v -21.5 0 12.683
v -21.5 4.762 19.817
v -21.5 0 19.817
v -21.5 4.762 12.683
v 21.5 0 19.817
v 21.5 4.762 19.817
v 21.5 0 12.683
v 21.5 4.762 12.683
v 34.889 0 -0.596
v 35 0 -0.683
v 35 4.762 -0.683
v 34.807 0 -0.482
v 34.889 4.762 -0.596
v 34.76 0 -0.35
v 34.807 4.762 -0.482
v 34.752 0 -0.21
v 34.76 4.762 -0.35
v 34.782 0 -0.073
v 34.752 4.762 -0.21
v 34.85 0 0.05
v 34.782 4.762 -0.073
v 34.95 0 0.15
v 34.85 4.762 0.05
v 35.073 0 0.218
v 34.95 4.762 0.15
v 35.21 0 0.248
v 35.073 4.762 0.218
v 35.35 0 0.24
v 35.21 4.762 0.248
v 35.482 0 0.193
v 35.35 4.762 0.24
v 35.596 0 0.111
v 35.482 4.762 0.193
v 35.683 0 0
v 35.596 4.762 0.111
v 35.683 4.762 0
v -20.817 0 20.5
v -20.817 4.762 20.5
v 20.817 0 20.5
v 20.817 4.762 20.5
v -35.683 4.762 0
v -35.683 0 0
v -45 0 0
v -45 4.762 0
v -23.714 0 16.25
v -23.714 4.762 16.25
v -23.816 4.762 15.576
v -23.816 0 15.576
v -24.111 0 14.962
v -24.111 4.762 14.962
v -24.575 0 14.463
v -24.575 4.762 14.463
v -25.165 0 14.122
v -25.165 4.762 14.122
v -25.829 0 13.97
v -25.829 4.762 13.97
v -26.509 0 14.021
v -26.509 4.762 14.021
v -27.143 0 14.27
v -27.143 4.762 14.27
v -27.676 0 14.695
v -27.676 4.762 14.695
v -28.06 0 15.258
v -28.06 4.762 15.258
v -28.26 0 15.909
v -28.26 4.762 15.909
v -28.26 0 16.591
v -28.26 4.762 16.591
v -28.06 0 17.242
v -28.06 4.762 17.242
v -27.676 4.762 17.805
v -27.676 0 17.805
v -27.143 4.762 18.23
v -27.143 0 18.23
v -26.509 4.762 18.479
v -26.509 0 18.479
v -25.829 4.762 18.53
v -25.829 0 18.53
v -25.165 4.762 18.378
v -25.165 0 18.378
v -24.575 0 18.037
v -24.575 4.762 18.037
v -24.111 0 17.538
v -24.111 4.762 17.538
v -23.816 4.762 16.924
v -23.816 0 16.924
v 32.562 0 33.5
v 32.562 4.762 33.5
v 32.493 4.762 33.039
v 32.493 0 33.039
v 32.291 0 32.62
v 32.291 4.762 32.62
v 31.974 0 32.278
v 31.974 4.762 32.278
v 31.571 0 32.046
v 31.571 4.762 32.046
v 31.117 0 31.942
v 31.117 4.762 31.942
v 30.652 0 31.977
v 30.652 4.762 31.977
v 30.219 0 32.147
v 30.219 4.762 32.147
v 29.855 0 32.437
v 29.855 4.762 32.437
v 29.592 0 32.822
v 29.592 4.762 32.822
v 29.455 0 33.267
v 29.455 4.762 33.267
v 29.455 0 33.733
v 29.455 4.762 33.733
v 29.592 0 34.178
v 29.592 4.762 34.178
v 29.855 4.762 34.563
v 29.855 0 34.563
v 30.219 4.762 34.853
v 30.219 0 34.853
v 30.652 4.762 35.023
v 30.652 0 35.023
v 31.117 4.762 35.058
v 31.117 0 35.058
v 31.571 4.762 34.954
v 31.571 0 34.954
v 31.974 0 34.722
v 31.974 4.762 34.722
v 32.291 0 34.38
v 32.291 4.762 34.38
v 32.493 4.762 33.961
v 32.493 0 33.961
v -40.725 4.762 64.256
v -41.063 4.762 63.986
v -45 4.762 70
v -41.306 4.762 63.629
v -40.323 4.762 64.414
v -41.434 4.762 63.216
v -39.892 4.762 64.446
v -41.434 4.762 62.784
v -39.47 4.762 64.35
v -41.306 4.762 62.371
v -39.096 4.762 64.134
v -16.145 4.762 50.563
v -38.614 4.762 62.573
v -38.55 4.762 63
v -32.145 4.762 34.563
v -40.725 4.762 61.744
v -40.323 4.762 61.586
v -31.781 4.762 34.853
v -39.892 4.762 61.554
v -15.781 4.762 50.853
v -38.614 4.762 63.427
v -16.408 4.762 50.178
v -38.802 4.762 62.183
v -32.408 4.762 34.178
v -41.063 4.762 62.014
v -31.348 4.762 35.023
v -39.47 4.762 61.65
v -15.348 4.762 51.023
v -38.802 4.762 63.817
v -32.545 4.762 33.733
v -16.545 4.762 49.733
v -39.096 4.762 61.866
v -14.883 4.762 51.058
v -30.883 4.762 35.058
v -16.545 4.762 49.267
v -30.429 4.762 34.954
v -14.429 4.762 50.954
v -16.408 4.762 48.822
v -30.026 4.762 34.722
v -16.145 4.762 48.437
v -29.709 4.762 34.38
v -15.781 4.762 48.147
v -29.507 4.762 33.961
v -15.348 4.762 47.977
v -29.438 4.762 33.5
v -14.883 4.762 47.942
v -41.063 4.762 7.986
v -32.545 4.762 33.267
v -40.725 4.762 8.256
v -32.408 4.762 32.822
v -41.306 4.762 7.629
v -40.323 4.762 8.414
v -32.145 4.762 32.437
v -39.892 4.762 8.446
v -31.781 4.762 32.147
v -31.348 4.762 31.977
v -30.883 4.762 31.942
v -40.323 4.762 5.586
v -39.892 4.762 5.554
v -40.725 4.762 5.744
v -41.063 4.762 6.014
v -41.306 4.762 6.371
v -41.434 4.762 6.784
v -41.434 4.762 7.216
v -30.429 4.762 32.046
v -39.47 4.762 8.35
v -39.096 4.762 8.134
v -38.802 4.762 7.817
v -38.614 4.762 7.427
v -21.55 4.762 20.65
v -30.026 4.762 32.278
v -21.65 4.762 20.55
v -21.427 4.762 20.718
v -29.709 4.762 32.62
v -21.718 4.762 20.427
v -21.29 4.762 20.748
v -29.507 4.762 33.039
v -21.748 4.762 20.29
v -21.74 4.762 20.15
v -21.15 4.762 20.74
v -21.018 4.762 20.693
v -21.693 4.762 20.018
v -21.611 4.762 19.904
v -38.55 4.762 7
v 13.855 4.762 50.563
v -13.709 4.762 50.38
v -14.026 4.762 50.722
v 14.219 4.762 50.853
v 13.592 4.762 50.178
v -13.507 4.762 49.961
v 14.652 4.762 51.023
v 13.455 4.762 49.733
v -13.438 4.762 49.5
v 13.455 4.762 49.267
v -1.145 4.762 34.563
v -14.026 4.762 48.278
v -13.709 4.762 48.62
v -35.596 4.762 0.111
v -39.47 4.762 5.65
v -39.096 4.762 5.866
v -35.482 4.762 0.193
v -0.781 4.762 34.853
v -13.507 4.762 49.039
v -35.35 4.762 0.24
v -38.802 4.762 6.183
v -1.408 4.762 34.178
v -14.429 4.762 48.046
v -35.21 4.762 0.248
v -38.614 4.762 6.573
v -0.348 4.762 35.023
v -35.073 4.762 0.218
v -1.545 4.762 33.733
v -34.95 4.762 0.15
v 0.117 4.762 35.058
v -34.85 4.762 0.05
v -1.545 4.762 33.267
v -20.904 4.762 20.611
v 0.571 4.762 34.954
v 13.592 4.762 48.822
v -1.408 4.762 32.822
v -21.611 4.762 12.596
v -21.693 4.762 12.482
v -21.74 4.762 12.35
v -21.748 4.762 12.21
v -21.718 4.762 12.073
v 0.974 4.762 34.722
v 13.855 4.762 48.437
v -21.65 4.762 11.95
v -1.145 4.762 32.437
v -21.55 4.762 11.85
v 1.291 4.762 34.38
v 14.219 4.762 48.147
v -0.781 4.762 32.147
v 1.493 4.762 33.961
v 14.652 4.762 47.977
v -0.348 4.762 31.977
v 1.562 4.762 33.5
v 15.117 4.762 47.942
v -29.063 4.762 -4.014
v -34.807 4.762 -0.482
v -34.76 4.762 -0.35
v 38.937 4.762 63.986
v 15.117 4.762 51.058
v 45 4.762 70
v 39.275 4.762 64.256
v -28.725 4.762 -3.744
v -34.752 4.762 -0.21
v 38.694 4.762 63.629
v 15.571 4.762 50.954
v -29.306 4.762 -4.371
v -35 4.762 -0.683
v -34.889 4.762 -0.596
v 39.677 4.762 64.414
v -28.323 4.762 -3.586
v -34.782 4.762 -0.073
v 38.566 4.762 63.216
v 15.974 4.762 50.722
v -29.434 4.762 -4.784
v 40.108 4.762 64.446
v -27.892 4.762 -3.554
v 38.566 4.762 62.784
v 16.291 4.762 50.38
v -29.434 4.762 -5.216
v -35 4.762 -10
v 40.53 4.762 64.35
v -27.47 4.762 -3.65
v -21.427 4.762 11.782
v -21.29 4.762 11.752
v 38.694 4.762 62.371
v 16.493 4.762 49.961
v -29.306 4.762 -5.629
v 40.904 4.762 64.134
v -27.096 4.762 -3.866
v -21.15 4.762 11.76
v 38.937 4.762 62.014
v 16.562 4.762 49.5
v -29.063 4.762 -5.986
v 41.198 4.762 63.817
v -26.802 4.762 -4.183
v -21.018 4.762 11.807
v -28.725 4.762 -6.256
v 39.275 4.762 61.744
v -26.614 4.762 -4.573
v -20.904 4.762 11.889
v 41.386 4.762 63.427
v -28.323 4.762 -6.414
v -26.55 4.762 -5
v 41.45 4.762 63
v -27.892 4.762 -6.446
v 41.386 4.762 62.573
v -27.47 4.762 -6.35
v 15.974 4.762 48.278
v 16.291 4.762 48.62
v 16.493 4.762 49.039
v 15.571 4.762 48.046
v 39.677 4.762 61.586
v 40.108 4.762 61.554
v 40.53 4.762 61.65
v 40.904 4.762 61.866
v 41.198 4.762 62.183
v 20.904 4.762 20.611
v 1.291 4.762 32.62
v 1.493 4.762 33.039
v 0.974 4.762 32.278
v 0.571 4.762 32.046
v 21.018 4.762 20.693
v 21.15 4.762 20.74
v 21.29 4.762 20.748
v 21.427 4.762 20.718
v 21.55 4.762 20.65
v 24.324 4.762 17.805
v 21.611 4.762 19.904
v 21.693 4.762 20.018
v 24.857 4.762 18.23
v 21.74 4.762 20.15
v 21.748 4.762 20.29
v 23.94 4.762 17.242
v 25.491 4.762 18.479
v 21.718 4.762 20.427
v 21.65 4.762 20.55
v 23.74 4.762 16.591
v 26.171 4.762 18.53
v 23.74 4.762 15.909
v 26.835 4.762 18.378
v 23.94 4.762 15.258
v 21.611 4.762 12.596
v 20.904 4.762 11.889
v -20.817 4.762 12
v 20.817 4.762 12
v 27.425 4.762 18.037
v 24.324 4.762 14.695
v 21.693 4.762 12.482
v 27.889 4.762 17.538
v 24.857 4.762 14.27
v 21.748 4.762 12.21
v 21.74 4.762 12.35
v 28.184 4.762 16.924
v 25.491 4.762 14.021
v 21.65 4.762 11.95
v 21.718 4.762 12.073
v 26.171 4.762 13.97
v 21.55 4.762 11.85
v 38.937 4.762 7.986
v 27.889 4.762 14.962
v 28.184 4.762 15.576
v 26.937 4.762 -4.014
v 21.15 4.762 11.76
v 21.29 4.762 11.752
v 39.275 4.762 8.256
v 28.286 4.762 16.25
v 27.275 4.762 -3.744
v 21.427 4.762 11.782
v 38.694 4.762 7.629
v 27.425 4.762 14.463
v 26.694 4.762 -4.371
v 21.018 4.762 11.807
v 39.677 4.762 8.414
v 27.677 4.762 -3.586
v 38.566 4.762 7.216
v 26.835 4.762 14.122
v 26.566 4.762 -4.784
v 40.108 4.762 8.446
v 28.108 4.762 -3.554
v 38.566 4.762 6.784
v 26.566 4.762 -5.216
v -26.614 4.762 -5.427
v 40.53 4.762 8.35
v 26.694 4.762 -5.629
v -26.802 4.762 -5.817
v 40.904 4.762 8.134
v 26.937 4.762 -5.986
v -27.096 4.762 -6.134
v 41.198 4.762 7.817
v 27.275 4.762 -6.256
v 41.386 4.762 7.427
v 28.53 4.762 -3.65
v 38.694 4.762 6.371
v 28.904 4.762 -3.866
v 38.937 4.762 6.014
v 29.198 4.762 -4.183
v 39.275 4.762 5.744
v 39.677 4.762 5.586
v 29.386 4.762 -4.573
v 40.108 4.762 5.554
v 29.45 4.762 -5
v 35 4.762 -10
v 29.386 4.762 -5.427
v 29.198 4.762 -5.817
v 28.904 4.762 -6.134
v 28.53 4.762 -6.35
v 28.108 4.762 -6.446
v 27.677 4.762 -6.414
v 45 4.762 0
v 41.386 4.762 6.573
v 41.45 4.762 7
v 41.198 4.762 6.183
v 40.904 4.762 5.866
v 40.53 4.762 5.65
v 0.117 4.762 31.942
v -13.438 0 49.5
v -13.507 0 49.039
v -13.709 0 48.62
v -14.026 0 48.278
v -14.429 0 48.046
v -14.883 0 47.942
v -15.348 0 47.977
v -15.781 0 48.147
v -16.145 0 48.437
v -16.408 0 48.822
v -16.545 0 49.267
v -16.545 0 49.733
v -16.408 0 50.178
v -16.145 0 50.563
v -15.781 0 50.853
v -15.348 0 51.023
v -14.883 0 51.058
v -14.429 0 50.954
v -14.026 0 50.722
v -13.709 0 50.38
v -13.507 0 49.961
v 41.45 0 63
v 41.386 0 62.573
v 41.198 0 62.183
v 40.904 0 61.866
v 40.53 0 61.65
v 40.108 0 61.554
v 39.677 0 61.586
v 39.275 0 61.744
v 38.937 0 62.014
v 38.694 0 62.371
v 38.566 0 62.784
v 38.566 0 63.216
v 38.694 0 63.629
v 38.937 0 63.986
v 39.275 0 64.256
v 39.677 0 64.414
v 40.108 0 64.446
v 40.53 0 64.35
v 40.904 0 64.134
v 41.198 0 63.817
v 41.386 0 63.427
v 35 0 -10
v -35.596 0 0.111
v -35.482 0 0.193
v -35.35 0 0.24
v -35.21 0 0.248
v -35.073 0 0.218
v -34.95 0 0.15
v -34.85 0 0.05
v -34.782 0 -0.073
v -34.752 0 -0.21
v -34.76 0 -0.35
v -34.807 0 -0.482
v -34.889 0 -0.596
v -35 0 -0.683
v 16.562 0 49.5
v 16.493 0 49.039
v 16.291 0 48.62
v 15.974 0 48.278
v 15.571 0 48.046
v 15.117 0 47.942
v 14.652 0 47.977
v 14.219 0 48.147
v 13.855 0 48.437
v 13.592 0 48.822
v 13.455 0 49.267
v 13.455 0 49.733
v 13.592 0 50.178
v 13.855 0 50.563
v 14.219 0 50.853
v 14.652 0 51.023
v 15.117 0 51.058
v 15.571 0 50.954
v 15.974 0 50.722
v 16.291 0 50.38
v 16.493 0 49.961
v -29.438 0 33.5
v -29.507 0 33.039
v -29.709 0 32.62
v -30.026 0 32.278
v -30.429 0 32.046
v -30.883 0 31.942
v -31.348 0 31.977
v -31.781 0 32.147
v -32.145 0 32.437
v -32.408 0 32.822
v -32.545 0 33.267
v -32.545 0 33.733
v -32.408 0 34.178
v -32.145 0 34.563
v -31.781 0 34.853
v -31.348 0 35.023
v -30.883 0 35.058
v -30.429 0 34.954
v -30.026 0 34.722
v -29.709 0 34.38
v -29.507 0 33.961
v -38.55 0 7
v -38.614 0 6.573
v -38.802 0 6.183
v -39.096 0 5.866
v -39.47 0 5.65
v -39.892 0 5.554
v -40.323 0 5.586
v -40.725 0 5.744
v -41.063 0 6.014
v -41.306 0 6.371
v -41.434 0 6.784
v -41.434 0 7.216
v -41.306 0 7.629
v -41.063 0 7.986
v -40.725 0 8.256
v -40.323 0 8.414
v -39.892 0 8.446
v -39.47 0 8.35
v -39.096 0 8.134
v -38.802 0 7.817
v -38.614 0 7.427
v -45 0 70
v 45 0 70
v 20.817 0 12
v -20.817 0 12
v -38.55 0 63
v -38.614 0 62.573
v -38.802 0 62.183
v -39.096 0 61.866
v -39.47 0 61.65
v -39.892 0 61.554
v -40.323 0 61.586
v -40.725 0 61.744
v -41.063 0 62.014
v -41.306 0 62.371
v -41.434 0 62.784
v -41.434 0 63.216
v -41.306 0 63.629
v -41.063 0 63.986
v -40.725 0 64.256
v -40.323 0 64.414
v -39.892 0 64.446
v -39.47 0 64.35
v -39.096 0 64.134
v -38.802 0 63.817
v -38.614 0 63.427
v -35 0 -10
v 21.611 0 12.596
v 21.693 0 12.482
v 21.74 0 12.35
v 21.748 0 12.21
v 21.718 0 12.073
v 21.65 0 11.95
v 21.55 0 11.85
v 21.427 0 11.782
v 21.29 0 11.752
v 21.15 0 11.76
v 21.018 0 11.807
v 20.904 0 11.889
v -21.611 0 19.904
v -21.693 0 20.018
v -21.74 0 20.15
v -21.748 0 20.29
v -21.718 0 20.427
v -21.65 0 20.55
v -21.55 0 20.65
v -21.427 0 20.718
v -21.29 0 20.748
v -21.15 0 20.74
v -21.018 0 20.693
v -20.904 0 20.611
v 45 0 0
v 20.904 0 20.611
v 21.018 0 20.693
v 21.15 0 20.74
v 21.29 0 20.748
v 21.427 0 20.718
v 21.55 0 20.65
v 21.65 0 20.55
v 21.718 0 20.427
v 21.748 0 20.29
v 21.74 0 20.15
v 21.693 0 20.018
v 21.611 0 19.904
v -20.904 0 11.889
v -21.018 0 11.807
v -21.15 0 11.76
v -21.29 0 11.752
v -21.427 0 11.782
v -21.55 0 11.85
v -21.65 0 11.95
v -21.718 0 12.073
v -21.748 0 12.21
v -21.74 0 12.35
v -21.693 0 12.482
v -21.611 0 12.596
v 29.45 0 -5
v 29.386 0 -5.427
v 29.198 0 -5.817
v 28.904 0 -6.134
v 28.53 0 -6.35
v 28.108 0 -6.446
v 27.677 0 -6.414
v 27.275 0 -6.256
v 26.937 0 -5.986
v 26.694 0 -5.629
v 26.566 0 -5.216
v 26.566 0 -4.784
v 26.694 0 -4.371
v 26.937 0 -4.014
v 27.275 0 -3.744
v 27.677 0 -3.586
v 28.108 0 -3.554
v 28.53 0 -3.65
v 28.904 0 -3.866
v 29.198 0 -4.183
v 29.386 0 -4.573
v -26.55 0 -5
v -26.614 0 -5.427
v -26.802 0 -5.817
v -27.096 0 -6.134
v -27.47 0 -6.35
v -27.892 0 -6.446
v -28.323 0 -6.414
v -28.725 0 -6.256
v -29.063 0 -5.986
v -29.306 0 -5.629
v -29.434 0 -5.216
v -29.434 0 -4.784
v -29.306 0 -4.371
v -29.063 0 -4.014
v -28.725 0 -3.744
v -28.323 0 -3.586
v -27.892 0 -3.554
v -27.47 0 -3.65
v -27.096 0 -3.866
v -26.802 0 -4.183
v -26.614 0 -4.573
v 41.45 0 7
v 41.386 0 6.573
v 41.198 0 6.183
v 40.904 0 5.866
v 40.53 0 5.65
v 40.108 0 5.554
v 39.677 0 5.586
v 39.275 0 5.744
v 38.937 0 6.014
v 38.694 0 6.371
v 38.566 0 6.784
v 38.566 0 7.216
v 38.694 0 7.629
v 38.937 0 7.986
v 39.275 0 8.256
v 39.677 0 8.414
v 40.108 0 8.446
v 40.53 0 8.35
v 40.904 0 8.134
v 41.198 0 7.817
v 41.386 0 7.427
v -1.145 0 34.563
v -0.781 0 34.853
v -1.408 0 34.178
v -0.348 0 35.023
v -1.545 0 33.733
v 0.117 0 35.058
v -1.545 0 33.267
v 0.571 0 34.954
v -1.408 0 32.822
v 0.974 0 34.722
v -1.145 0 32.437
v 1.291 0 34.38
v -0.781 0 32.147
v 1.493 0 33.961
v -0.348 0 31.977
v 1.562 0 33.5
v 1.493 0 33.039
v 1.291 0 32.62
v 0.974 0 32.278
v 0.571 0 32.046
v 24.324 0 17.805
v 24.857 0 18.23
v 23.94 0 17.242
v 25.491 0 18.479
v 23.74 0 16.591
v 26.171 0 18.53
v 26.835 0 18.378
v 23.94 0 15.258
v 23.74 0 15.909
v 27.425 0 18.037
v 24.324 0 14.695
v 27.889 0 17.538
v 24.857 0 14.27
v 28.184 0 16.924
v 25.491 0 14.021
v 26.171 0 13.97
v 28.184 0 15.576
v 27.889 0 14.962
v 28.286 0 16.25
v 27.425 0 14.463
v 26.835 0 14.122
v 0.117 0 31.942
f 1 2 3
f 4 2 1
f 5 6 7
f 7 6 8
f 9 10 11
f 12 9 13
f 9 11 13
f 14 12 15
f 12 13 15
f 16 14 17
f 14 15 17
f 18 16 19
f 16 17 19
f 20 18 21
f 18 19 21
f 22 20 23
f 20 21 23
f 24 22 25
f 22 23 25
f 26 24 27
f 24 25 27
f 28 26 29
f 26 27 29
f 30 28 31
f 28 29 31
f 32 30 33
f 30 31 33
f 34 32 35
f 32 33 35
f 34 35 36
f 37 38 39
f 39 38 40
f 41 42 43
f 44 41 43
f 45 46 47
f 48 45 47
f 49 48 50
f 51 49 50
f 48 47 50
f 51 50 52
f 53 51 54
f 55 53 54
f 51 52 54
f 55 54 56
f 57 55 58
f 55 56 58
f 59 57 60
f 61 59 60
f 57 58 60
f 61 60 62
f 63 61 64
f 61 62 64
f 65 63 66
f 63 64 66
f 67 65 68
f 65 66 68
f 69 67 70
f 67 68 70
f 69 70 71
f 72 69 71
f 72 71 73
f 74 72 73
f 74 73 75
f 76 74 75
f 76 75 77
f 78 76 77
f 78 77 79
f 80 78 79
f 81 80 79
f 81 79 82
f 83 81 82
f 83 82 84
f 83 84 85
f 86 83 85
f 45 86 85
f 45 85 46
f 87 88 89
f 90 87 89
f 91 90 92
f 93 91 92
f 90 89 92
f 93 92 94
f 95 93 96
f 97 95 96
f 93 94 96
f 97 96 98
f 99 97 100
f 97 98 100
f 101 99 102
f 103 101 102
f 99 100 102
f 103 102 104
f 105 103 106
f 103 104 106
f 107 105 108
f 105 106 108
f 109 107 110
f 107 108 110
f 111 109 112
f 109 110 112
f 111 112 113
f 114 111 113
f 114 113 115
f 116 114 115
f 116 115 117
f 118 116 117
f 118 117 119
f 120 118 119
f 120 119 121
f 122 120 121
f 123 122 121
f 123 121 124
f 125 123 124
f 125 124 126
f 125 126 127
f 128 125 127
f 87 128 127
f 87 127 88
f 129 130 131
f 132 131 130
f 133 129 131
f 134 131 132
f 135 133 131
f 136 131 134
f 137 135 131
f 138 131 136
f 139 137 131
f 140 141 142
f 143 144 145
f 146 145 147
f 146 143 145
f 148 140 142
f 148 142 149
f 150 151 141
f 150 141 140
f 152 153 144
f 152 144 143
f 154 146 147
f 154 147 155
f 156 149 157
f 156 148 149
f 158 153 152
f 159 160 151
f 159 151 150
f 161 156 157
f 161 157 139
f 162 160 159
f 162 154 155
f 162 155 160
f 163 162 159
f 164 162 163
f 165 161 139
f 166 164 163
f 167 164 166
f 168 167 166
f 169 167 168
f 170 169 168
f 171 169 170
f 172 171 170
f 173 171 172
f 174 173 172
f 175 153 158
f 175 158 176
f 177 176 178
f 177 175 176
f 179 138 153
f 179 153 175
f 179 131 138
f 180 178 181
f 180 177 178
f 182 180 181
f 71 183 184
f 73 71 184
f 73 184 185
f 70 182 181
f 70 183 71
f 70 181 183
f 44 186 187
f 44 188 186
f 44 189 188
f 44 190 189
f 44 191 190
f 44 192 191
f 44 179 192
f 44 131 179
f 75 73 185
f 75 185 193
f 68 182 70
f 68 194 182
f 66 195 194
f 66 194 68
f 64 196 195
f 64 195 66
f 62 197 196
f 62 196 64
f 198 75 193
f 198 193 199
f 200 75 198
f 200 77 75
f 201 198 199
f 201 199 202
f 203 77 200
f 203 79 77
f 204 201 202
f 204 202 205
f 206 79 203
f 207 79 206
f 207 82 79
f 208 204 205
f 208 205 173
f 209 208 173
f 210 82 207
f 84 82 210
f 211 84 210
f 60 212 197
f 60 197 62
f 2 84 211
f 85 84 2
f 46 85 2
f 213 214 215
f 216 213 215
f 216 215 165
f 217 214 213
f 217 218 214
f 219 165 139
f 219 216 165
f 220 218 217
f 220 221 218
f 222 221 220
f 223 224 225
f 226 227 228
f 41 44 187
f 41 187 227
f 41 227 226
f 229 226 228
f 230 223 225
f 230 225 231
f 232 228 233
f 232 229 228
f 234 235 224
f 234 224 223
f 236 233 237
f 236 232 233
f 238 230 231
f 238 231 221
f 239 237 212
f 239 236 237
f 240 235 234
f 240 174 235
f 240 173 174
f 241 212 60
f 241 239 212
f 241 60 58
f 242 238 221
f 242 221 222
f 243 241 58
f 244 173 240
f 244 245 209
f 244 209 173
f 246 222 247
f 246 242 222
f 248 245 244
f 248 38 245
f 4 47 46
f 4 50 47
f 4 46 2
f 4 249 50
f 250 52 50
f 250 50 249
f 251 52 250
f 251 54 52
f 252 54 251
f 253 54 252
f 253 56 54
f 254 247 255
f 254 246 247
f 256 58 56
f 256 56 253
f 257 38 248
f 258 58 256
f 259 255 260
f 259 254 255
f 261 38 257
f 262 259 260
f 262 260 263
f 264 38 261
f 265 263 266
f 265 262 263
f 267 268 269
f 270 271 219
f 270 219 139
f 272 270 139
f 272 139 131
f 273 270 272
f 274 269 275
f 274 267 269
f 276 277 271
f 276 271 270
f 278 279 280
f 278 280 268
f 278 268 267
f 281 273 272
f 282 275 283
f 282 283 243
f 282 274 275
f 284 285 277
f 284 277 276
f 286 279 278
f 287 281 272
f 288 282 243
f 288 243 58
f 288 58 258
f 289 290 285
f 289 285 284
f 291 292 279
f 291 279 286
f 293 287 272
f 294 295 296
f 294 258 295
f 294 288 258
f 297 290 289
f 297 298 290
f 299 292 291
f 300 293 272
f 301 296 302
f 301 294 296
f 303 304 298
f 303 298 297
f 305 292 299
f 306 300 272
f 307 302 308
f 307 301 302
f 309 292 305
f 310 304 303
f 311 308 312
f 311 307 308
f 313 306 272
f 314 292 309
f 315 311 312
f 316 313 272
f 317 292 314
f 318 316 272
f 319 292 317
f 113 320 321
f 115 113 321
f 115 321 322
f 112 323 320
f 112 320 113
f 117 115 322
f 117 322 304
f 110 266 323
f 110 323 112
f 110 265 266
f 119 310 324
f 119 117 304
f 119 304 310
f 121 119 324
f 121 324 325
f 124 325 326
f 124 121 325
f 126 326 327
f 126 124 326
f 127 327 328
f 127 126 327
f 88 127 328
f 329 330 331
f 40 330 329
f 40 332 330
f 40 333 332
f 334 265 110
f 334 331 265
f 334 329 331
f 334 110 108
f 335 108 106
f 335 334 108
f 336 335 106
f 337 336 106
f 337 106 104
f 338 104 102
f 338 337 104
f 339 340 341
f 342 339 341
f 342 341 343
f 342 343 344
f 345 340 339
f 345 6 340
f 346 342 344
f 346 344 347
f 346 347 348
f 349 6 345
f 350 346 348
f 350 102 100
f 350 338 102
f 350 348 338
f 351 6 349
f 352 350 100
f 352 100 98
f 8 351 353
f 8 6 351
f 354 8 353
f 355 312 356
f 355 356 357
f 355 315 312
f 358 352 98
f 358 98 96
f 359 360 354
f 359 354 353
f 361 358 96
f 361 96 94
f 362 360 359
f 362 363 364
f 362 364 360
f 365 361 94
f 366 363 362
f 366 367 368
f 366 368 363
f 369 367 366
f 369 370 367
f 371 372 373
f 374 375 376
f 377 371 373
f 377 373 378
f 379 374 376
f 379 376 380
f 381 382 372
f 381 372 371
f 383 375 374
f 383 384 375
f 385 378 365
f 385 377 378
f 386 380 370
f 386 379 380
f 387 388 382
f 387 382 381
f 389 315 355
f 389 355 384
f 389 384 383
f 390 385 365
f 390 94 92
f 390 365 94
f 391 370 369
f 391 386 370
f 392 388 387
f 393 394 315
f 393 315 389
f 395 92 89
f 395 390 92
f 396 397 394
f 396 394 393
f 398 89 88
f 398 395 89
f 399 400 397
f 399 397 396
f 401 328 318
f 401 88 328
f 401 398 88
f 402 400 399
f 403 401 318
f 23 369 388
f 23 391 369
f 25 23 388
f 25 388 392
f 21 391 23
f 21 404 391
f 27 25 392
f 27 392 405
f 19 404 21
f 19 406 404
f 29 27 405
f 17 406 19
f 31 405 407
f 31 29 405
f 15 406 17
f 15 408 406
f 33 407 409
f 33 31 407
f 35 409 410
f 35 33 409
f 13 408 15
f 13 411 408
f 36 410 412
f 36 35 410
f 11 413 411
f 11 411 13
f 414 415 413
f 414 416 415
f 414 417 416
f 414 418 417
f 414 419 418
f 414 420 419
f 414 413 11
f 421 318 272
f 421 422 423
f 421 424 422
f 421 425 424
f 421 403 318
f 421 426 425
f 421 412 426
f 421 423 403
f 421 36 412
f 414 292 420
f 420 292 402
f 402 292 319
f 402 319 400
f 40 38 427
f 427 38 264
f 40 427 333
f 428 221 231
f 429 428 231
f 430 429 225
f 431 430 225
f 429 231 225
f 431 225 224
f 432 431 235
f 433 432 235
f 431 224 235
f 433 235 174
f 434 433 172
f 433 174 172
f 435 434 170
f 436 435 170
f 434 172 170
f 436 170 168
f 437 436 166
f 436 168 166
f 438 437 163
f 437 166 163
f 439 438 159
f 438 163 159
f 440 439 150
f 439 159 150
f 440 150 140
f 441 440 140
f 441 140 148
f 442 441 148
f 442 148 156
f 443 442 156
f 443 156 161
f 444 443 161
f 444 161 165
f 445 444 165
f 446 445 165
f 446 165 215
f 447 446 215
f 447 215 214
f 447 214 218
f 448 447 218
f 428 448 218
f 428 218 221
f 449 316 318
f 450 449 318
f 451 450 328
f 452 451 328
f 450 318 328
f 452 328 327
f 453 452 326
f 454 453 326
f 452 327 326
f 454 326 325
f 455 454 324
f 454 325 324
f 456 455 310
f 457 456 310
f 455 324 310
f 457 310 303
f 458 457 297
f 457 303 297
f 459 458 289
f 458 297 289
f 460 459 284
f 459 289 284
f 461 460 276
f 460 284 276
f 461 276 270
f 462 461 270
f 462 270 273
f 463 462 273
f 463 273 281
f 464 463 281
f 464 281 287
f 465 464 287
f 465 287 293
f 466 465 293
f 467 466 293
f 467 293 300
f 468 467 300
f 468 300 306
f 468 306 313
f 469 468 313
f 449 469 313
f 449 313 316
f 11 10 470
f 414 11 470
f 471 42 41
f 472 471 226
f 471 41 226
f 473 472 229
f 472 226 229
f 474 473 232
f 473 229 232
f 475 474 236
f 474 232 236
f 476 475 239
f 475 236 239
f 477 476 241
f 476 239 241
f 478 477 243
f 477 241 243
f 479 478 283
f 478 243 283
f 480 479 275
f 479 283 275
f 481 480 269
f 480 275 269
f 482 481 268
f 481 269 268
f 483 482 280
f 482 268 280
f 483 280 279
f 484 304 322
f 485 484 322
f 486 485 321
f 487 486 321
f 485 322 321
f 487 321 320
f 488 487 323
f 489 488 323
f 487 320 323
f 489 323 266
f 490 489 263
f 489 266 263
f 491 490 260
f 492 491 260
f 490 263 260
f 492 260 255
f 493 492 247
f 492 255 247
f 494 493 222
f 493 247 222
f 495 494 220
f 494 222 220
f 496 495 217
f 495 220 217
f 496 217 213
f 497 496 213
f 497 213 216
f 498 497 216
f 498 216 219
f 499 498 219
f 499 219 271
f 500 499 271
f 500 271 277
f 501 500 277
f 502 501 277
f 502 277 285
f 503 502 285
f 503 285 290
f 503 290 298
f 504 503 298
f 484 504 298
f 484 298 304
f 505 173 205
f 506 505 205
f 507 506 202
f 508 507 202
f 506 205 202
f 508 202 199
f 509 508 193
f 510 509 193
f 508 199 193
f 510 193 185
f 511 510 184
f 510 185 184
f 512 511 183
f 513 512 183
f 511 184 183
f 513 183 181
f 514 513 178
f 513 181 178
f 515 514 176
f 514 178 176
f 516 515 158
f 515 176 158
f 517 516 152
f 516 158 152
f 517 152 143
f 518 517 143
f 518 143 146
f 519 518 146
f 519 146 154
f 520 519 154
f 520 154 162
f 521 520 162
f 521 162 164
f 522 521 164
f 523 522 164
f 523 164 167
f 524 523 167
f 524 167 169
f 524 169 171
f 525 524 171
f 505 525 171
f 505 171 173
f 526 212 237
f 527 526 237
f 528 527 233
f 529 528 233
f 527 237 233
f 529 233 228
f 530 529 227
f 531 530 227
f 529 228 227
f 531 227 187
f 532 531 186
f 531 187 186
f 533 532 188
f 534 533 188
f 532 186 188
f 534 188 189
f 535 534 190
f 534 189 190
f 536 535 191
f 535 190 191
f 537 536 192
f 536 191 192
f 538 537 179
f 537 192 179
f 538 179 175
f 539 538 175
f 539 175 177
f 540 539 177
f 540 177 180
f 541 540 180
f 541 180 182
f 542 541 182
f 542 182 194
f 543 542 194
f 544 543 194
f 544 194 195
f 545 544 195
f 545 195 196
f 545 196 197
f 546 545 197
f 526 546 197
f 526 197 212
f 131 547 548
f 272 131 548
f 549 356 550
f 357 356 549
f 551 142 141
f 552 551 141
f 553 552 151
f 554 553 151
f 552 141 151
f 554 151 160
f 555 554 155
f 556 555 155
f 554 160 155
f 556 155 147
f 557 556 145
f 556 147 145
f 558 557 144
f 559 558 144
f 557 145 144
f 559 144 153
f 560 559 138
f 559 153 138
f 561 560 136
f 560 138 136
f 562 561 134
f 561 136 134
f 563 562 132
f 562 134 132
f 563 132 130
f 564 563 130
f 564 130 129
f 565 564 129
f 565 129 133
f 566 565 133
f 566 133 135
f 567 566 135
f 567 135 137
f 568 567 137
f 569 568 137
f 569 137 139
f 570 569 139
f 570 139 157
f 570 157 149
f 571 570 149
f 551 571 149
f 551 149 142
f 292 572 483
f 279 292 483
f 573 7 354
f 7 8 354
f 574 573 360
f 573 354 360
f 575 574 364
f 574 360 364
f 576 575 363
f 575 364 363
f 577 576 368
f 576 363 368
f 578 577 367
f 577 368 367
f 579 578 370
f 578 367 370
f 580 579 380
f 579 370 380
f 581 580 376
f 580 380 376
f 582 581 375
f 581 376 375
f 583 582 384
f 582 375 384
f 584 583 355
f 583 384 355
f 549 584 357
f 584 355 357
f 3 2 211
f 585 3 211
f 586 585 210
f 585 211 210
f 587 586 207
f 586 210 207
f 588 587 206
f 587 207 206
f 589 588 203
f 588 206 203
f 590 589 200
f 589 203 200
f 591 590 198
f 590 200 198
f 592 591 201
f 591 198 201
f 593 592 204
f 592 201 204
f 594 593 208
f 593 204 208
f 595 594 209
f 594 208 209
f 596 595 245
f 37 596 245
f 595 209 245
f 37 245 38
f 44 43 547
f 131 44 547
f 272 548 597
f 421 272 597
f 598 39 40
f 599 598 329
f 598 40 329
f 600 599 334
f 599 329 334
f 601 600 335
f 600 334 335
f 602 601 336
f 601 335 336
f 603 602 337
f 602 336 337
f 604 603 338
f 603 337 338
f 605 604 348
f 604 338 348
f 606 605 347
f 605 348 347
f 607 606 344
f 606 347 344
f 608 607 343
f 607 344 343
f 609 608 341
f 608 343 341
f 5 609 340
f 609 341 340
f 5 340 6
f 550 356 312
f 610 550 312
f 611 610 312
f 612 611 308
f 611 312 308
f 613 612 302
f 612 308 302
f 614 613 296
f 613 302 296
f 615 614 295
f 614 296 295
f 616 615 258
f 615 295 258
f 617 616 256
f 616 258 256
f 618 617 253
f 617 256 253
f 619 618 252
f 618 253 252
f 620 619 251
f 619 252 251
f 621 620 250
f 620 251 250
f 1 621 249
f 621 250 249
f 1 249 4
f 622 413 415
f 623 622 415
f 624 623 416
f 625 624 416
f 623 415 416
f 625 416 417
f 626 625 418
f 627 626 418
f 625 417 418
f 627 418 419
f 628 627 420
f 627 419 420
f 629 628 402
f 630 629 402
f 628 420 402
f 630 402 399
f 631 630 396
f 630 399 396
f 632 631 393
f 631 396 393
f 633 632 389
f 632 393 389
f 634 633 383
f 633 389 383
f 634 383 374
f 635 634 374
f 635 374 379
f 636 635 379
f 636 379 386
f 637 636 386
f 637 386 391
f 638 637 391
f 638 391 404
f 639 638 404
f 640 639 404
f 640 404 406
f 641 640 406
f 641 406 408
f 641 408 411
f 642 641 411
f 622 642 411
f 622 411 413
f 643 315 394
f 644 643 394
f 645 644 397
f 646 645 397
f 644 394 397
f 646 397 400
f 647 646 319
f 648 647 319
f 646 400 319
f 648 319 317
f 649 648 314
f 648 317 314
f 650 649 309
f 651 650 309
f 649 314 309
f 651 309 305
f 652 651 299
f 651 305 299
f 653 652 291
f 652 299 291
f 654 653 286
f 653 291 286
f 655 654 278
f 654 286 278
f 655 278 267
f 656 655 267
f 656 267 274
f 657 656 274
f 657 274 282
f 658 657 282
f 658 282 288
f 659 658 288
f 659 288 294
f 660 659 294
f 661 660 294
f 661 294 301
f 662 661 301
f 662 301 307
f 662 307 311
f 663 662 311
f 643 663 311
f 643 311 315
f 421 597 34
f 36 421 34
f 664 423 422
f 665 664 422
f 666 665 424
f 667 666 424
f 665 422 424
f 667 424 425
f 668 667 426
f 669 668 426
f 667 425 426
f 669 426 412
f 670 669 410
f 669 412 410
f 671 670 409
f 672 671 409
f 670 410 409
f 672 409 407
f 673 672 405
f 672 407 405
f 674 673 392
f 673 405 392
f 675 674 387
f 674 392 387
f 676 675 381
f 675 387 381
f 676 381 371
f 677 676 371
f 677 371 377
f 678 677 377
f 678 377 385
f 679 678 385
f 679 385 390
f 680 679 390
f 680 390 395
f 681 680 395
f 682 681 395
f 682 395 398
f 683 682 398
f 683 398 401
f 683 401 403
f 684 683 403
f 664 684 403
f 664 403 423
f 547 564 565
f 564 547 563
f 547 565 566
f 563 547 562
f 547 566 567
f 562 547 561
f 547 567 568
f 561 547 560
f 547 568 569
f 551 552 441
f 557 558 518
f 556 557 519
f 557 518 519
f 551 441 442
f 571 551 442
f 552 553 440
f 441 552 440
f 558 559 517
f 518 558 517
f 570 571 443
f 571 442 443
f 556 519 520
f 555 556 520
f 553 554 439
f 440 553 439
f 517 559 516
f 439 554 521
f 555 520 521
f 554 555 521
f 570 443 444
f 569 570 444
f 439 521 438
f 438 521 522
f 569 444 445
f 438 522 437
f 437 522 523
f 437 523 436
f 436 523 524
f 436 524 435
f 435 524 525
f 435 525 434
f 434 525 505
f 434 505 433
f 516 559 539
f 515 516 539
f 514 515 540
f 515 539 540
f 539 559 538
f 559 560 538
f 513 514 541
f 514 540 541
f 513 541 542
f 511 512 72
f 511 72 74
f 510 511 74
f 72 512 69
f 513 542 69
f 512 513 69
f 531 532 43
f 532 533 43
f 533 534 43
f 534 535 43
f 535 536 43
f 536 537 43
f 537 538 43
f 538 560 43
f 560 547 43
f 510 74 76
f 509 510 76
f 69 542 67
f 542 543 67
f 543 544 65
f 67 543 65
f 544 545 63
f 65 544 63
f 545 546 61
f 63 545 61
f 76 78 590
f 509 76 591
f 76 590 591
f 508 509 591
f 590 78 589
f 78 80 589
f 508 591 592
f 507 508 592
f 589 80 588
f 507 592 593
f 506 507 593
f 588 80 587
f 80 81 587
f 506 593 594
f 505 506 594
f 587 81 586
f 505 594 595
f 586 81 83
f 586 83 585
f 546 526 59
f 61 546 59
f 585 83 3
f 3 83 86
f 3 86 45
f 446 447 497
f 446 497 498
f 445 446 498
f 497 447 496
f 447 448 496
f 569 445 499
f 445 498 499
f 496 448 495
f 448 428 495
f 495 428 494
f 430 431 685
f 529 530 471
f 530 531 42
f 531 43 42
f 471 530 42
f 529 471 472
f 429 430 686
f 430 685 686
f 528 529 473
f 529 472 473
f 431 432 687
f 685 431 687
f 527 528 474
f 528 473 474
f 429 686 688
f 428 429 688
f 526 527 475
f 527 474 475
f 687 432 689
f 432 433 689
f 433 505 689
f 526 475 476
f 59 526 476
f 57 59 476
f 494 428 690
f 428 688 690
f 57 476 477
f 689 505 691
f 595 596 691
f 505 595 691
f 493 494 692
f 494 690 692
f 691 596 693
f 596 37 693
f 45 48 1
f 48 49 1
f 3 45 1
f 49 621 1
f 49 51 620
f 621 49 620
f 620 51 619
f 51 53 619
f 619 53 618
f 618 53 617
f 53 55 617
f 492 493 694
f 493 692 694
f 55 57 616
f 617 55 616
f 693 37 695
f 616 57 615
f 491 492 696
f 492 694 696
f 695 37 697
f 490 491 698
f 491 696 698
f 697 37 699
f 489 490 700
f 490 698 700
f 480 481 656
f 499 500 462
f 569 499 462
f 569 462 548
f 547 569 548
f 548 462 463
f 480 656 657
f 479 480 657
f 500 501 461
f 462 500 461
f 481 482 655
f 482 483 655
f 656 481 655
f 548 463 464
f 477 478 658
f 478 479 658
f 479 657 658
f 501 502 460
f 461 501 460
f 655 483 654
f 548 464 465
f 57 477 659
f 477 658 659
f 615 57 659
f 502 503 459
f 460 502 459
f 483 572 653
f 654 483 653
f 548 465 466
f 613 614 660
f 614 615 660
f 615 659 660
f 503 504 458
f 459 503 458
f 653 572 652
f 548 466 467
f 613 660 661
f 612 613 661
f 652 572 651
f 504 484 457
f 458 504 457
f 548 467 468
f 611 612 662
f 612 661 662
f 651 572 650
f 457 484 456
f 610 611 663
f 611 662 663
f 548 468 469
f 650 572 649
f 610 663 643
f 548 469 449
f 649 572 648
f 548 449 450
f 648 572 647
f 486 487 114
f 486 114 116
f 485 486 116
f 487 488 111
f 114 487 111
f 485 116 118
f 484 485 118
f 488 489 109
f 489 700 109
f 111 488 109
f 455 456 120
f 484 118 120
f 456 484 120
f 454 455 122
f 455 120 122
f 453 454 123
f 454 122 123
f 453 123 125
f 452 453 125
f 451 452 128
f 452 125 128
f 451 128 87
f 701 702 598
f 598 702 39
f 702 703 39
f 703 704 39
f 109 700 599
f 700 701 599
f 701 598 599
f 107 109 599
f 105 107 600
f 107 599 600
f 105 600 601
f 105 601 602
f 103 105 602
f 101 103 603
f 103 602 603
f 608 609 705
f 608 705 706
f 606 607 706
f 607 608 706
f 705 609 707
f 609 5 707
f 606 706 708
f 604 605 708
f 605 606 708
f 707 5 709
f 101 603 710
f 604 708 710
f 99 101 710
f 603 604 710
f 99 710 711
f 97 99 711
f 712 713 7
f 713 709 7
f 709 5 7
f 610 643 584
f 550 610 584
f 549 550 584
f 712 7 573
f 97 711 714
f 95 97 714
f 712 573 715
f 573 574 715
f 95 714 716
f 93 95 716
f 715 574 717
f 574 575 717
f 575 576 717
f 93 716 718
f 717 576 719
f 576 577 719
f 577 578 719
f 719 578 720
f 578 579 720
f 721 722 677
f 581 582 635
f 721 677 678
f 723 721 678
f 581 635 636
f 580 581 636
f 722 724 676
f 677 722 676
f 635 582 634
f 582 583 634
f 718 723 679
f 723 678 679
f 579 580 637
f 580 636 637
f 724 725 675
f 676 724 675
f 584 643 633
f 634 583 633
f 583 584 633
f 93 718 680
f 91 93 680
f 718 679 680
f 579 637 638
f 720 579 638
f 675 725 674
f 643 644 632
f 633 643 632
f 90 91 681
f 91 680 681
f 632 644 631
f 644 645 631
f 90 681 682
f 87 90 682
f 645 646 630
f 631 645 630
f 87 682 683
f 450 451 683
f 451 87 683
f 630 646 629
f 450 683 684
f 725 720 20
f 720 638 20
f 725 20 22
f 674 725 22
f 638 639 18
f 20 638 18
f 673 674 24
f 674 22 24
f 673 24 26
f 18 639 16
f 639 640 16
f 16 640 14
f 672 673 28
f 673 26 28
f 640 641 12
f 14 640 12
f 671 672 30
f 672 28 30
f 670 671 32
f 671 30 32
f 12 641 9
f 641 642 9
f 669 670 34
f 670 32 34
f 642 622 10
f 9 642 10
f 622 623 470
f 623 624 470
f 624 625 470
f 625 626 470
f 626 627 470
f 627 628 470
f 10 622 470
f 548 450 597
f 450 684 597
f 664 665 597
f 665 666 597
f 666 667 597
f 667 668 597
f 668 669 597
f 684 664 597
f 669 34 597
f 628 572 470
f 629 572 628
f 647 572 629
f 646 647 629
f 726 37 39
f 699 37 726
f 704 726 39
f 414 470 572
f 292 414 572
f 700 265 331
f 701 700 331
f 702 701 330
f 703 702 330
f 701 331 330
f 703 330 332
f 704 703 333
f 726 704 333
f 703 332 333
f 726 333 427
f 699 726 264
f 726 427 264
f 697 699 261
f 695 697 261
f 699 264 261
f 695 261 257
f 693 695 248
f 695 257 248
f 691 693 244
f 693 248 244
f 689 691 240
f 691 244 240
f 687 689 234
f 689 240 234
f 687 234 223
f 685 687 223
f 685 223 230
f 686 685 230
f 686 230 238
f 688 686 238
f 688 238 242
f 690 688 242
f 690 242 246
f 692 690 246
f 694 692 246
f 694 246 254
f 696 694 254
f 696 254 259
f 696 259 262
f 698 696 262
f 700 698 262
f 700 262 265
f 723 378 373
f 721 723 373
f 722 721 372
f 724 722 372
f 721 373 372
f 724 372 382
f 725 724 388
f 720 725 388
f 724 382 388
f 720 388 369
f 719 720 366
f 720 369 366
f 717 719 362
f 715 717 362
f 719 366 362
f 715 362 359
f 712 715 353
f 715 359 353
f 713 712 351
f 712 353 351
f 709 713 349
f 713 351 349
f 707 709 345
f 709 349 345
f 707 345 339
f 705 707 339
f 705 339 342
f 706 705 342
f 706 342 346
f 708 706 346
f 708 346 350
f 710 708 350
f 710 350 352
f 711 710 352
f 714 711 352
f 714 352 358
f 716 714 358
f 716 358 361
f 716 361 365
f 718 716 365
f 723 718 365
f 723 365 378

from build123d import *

# Parameters (mm, degrees)
BASE_DEPTH         = 4.7625
SKETCH2_R          = 1.5625
CUT_EXTRUDE1_DEPTH = 5.7625
SKETCH3_R          = 2.286
SKETCH3_W          = 43
SKETCH3_H          = 8.5
CUT_EXTRUDE2_DEPTH = 5.7625
SKETCH4_R          = 1.45
CUT_EXTRUDE3_DEPTH = 5.7625
SKETCH5_R          = 0.5
CUT_EXTRUDE4_DEPTH = 5.7625


with BuildPart() as part:
    # Sketch1 → Base (new body)
    with BuildSketch(Plane(origin=(0, 0, 0), x_dir=(1, 0, 0), z_dir=(0, 1, 0))):
        Polygon((-35, 0), (-45, 0), (-45, -70), (45, -70), (45, 0), (35, 0), (35, 10), (-35, 10), align=None)
    extrude(amount=BASE_DEPTH)

    # Sketch2 → Cut-Extrude1 (cut, through all)
    with BuildSketch(Plane(origin=(0, 4.7625, 0), x_dir=(1, 0, 0), z_dir=(0, 1, 0))):
        with Locations((-31, -33.5)):
            Circle(SKETCH2_R)
        with Locations((0, -33.5)):
            Circle(SKETCH2_R)
        with Locations((31, -33.5)):
            Circle(SKETCH2_R)
        with Locations((15, -49.5)):
            Circle(SKETCH2_R)
        with Locations((-15, -49.5)):
            Circle(SKETCH2_R)
    extrude(amount=-CUT_EXTRUDE1_DEPTH, mode=Mode.SUBTRACT)

    # Sketch3 → Cut-Extrude2 (cut, through all)
    with BuildSketch(Plane(origin=(0, 4.7625, 0), x_dir=(1, 0, 0), z_dir=(0, 1, 0))):
        with Locations((-26, -16.25)):
            Circle(SKETCH3_R)
        with Locations((26, -16.25)):
            Circle(SKETCH3_R)
        with Locations((0, -16.25)):
            Rectangle(SKETCH3_W, SKETCH3_H)
    extrude(amount=-CUT_EXTRUDE2_DEPTH, mode=Mode.SUBTRACT)

    # Sketch4 → Cut-Extrude3 (cut, through all)
    with BuildSketch(Plane(origin=(0, 4.7625, 0), x_dir=(1, 0, 0), z_dir=(0, 1, 0))):
        with Locations((-28, 5)):
            Circle(SKETCH4_R)
        with Locations((-40, -7)):
            Circle(SKETCH4_R)
        with Locations((-40, -63)):
            Circle(SKETCH4_R)
        with Locations((40, -63)):
            Circle(SKETCH4_R)
        with Locations((40, -7)):
            Circle(SKETCH4_R)
        with Locations((28, 5)):
            Circle(SKETCH4_R)
    extrude(amount=-CUT_EXTRUDE3_DEPTH, mode=Mode.SUBTRACT)

    # Sketch5 → Cut-Extrude4 (cut, through all)
    with BuildSketch(Plane(origin=(0, 4.7625, 0), x_dir=(1, 0, 0), z_dir=(0, 1, 0))):
        with Locations((-35.25, 0.25)):
            Circle(SKETCH5_R)
        with Locations((-21.25, -12.25)):
            Circle(SKETCH5_R)
        with Locations((-21.25, -20.25)):
            Circle(SKETCH5_R)
        with Locations((35.25, 0.25)):
            Circle(SKETCH5_R)
        with Locations((21.25, -12.25)):
            Circle(SKETCH5_R)
        with Locations((21.25, -20.25)):
            Circle(SKETCH5_R)
    extrude(amount=-CUT_EXTRUDE4_DEPTH, mode=Mode.SUBTRACT)


solid = part.part
